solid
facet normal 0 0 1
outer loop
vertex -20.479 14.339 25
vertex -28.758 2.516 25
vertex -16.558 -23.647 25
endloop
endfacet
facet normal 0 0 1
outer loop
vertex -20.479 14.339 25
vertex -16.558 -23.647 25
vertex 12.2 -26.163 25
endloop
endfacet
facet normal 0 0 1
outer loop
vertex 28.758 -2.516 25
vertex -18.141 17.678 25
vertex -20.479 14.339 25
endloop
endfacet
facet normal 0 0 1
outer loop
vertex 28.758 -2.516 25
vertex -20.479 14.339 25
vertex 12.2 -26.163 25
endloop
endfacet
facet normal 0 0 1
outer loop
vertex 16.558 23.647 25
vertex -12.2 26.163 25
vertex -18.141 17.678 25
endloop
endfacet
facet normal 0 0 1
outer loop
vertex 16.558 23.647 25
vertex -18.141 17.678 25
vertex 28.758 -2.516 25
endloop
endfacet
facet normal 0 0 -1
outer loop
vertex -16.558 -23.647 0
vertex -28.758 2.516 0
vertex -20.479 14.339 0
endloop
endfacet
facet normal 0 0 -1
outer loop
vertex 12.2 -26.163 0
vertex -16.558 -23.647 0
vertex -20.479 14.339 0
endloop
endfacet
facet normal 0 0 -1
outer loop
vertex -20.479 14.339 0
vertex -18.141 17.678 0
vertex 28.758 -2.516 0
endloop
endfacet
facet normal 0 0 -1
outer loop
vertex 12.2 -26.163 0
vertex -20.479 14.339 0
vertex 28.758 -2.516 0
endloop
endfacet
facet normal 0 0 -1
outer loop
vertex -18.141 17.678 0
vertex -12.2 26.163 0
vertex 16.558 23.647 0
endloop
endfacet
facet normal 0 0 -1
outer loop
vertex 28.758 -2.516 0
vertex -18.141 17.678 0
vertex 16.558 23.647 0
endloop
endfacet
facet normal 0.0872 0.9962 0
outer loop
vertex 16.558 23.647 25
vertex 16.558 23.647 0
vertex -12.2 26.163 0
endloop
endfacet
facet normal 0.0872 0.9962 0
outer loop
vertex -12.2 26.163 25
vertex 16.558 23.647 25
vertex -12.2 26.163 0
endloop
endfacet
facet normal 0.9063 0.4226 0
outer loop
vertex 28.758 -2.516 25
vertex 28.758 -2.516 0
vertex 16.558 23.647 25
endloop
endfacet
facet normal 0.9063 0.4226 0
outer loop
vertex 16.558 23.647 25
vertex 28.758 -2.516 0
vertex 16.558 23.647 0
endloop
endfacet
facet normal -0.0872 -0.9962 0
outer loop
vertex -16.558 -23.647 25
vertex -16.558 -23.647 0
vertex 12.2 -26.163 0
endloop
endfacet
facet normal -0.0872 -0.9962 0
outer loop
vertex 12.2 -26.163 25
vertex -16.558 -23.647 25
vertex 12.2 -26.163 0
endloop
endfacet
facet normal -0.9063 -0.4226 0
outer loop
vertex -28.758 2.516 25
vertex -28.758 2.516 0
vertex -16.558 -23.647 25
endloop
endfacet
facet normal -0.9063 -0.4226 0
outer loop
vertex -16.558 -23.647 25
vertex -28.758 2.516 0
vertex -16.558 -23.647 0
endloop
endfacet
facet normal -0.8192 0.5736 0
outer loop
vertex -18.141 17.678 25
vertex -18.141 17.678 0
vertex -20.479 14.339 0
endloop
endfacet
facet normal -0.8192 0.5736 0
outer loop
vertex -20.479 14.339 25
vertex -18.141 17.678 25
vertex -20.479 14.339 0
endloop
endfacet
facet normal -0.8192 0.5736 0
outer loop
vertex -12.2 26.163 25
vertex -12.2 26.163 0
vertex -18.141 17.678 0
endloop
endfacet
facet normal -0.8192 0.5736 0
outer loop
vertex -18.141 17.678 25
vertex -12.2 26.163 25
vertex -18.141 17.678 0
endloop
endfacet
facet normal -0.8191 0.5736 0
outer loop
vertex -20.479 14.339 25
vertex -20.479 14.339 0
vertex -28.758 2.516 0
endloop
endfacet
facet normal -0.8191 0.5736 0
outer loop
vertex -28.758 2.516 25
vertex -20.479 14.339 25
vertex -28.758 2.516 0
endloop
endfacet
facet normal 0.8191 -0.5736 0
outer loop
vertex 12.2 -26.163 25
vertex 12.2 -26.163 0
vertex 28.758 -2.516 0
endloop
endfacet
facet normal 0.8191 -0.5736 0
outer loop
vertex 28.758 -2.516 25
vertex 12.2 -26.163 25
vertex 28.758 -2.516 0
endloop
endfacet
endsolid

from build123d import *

# Parameters (mm, degrees)
F1_DEPTH = 25


with BuildPart() as f1:
    # F0 (on Top) → F1 (new body)
    with BuildSketch(Plane.XY):
        Polygon((-17.67767, 17.67767), (-18.141327, 17.67767), (-20.478801, 14.339411), (0, 0), align=None)
        Polygon((16.557725, 23.646883), (-12.199938, 26.162852), (-18.141327, 17.67767), (-17.67767, 17.67767), (0, 0), (-20.478801, 14.339411), (-28.757664, 2.51597), (-16.557725, -23.646883), (12.199938, -26.162852), (28.757664, -2.51597), align=None)
    extrude(amount=F1_DEPTH)


solid = f1.part
